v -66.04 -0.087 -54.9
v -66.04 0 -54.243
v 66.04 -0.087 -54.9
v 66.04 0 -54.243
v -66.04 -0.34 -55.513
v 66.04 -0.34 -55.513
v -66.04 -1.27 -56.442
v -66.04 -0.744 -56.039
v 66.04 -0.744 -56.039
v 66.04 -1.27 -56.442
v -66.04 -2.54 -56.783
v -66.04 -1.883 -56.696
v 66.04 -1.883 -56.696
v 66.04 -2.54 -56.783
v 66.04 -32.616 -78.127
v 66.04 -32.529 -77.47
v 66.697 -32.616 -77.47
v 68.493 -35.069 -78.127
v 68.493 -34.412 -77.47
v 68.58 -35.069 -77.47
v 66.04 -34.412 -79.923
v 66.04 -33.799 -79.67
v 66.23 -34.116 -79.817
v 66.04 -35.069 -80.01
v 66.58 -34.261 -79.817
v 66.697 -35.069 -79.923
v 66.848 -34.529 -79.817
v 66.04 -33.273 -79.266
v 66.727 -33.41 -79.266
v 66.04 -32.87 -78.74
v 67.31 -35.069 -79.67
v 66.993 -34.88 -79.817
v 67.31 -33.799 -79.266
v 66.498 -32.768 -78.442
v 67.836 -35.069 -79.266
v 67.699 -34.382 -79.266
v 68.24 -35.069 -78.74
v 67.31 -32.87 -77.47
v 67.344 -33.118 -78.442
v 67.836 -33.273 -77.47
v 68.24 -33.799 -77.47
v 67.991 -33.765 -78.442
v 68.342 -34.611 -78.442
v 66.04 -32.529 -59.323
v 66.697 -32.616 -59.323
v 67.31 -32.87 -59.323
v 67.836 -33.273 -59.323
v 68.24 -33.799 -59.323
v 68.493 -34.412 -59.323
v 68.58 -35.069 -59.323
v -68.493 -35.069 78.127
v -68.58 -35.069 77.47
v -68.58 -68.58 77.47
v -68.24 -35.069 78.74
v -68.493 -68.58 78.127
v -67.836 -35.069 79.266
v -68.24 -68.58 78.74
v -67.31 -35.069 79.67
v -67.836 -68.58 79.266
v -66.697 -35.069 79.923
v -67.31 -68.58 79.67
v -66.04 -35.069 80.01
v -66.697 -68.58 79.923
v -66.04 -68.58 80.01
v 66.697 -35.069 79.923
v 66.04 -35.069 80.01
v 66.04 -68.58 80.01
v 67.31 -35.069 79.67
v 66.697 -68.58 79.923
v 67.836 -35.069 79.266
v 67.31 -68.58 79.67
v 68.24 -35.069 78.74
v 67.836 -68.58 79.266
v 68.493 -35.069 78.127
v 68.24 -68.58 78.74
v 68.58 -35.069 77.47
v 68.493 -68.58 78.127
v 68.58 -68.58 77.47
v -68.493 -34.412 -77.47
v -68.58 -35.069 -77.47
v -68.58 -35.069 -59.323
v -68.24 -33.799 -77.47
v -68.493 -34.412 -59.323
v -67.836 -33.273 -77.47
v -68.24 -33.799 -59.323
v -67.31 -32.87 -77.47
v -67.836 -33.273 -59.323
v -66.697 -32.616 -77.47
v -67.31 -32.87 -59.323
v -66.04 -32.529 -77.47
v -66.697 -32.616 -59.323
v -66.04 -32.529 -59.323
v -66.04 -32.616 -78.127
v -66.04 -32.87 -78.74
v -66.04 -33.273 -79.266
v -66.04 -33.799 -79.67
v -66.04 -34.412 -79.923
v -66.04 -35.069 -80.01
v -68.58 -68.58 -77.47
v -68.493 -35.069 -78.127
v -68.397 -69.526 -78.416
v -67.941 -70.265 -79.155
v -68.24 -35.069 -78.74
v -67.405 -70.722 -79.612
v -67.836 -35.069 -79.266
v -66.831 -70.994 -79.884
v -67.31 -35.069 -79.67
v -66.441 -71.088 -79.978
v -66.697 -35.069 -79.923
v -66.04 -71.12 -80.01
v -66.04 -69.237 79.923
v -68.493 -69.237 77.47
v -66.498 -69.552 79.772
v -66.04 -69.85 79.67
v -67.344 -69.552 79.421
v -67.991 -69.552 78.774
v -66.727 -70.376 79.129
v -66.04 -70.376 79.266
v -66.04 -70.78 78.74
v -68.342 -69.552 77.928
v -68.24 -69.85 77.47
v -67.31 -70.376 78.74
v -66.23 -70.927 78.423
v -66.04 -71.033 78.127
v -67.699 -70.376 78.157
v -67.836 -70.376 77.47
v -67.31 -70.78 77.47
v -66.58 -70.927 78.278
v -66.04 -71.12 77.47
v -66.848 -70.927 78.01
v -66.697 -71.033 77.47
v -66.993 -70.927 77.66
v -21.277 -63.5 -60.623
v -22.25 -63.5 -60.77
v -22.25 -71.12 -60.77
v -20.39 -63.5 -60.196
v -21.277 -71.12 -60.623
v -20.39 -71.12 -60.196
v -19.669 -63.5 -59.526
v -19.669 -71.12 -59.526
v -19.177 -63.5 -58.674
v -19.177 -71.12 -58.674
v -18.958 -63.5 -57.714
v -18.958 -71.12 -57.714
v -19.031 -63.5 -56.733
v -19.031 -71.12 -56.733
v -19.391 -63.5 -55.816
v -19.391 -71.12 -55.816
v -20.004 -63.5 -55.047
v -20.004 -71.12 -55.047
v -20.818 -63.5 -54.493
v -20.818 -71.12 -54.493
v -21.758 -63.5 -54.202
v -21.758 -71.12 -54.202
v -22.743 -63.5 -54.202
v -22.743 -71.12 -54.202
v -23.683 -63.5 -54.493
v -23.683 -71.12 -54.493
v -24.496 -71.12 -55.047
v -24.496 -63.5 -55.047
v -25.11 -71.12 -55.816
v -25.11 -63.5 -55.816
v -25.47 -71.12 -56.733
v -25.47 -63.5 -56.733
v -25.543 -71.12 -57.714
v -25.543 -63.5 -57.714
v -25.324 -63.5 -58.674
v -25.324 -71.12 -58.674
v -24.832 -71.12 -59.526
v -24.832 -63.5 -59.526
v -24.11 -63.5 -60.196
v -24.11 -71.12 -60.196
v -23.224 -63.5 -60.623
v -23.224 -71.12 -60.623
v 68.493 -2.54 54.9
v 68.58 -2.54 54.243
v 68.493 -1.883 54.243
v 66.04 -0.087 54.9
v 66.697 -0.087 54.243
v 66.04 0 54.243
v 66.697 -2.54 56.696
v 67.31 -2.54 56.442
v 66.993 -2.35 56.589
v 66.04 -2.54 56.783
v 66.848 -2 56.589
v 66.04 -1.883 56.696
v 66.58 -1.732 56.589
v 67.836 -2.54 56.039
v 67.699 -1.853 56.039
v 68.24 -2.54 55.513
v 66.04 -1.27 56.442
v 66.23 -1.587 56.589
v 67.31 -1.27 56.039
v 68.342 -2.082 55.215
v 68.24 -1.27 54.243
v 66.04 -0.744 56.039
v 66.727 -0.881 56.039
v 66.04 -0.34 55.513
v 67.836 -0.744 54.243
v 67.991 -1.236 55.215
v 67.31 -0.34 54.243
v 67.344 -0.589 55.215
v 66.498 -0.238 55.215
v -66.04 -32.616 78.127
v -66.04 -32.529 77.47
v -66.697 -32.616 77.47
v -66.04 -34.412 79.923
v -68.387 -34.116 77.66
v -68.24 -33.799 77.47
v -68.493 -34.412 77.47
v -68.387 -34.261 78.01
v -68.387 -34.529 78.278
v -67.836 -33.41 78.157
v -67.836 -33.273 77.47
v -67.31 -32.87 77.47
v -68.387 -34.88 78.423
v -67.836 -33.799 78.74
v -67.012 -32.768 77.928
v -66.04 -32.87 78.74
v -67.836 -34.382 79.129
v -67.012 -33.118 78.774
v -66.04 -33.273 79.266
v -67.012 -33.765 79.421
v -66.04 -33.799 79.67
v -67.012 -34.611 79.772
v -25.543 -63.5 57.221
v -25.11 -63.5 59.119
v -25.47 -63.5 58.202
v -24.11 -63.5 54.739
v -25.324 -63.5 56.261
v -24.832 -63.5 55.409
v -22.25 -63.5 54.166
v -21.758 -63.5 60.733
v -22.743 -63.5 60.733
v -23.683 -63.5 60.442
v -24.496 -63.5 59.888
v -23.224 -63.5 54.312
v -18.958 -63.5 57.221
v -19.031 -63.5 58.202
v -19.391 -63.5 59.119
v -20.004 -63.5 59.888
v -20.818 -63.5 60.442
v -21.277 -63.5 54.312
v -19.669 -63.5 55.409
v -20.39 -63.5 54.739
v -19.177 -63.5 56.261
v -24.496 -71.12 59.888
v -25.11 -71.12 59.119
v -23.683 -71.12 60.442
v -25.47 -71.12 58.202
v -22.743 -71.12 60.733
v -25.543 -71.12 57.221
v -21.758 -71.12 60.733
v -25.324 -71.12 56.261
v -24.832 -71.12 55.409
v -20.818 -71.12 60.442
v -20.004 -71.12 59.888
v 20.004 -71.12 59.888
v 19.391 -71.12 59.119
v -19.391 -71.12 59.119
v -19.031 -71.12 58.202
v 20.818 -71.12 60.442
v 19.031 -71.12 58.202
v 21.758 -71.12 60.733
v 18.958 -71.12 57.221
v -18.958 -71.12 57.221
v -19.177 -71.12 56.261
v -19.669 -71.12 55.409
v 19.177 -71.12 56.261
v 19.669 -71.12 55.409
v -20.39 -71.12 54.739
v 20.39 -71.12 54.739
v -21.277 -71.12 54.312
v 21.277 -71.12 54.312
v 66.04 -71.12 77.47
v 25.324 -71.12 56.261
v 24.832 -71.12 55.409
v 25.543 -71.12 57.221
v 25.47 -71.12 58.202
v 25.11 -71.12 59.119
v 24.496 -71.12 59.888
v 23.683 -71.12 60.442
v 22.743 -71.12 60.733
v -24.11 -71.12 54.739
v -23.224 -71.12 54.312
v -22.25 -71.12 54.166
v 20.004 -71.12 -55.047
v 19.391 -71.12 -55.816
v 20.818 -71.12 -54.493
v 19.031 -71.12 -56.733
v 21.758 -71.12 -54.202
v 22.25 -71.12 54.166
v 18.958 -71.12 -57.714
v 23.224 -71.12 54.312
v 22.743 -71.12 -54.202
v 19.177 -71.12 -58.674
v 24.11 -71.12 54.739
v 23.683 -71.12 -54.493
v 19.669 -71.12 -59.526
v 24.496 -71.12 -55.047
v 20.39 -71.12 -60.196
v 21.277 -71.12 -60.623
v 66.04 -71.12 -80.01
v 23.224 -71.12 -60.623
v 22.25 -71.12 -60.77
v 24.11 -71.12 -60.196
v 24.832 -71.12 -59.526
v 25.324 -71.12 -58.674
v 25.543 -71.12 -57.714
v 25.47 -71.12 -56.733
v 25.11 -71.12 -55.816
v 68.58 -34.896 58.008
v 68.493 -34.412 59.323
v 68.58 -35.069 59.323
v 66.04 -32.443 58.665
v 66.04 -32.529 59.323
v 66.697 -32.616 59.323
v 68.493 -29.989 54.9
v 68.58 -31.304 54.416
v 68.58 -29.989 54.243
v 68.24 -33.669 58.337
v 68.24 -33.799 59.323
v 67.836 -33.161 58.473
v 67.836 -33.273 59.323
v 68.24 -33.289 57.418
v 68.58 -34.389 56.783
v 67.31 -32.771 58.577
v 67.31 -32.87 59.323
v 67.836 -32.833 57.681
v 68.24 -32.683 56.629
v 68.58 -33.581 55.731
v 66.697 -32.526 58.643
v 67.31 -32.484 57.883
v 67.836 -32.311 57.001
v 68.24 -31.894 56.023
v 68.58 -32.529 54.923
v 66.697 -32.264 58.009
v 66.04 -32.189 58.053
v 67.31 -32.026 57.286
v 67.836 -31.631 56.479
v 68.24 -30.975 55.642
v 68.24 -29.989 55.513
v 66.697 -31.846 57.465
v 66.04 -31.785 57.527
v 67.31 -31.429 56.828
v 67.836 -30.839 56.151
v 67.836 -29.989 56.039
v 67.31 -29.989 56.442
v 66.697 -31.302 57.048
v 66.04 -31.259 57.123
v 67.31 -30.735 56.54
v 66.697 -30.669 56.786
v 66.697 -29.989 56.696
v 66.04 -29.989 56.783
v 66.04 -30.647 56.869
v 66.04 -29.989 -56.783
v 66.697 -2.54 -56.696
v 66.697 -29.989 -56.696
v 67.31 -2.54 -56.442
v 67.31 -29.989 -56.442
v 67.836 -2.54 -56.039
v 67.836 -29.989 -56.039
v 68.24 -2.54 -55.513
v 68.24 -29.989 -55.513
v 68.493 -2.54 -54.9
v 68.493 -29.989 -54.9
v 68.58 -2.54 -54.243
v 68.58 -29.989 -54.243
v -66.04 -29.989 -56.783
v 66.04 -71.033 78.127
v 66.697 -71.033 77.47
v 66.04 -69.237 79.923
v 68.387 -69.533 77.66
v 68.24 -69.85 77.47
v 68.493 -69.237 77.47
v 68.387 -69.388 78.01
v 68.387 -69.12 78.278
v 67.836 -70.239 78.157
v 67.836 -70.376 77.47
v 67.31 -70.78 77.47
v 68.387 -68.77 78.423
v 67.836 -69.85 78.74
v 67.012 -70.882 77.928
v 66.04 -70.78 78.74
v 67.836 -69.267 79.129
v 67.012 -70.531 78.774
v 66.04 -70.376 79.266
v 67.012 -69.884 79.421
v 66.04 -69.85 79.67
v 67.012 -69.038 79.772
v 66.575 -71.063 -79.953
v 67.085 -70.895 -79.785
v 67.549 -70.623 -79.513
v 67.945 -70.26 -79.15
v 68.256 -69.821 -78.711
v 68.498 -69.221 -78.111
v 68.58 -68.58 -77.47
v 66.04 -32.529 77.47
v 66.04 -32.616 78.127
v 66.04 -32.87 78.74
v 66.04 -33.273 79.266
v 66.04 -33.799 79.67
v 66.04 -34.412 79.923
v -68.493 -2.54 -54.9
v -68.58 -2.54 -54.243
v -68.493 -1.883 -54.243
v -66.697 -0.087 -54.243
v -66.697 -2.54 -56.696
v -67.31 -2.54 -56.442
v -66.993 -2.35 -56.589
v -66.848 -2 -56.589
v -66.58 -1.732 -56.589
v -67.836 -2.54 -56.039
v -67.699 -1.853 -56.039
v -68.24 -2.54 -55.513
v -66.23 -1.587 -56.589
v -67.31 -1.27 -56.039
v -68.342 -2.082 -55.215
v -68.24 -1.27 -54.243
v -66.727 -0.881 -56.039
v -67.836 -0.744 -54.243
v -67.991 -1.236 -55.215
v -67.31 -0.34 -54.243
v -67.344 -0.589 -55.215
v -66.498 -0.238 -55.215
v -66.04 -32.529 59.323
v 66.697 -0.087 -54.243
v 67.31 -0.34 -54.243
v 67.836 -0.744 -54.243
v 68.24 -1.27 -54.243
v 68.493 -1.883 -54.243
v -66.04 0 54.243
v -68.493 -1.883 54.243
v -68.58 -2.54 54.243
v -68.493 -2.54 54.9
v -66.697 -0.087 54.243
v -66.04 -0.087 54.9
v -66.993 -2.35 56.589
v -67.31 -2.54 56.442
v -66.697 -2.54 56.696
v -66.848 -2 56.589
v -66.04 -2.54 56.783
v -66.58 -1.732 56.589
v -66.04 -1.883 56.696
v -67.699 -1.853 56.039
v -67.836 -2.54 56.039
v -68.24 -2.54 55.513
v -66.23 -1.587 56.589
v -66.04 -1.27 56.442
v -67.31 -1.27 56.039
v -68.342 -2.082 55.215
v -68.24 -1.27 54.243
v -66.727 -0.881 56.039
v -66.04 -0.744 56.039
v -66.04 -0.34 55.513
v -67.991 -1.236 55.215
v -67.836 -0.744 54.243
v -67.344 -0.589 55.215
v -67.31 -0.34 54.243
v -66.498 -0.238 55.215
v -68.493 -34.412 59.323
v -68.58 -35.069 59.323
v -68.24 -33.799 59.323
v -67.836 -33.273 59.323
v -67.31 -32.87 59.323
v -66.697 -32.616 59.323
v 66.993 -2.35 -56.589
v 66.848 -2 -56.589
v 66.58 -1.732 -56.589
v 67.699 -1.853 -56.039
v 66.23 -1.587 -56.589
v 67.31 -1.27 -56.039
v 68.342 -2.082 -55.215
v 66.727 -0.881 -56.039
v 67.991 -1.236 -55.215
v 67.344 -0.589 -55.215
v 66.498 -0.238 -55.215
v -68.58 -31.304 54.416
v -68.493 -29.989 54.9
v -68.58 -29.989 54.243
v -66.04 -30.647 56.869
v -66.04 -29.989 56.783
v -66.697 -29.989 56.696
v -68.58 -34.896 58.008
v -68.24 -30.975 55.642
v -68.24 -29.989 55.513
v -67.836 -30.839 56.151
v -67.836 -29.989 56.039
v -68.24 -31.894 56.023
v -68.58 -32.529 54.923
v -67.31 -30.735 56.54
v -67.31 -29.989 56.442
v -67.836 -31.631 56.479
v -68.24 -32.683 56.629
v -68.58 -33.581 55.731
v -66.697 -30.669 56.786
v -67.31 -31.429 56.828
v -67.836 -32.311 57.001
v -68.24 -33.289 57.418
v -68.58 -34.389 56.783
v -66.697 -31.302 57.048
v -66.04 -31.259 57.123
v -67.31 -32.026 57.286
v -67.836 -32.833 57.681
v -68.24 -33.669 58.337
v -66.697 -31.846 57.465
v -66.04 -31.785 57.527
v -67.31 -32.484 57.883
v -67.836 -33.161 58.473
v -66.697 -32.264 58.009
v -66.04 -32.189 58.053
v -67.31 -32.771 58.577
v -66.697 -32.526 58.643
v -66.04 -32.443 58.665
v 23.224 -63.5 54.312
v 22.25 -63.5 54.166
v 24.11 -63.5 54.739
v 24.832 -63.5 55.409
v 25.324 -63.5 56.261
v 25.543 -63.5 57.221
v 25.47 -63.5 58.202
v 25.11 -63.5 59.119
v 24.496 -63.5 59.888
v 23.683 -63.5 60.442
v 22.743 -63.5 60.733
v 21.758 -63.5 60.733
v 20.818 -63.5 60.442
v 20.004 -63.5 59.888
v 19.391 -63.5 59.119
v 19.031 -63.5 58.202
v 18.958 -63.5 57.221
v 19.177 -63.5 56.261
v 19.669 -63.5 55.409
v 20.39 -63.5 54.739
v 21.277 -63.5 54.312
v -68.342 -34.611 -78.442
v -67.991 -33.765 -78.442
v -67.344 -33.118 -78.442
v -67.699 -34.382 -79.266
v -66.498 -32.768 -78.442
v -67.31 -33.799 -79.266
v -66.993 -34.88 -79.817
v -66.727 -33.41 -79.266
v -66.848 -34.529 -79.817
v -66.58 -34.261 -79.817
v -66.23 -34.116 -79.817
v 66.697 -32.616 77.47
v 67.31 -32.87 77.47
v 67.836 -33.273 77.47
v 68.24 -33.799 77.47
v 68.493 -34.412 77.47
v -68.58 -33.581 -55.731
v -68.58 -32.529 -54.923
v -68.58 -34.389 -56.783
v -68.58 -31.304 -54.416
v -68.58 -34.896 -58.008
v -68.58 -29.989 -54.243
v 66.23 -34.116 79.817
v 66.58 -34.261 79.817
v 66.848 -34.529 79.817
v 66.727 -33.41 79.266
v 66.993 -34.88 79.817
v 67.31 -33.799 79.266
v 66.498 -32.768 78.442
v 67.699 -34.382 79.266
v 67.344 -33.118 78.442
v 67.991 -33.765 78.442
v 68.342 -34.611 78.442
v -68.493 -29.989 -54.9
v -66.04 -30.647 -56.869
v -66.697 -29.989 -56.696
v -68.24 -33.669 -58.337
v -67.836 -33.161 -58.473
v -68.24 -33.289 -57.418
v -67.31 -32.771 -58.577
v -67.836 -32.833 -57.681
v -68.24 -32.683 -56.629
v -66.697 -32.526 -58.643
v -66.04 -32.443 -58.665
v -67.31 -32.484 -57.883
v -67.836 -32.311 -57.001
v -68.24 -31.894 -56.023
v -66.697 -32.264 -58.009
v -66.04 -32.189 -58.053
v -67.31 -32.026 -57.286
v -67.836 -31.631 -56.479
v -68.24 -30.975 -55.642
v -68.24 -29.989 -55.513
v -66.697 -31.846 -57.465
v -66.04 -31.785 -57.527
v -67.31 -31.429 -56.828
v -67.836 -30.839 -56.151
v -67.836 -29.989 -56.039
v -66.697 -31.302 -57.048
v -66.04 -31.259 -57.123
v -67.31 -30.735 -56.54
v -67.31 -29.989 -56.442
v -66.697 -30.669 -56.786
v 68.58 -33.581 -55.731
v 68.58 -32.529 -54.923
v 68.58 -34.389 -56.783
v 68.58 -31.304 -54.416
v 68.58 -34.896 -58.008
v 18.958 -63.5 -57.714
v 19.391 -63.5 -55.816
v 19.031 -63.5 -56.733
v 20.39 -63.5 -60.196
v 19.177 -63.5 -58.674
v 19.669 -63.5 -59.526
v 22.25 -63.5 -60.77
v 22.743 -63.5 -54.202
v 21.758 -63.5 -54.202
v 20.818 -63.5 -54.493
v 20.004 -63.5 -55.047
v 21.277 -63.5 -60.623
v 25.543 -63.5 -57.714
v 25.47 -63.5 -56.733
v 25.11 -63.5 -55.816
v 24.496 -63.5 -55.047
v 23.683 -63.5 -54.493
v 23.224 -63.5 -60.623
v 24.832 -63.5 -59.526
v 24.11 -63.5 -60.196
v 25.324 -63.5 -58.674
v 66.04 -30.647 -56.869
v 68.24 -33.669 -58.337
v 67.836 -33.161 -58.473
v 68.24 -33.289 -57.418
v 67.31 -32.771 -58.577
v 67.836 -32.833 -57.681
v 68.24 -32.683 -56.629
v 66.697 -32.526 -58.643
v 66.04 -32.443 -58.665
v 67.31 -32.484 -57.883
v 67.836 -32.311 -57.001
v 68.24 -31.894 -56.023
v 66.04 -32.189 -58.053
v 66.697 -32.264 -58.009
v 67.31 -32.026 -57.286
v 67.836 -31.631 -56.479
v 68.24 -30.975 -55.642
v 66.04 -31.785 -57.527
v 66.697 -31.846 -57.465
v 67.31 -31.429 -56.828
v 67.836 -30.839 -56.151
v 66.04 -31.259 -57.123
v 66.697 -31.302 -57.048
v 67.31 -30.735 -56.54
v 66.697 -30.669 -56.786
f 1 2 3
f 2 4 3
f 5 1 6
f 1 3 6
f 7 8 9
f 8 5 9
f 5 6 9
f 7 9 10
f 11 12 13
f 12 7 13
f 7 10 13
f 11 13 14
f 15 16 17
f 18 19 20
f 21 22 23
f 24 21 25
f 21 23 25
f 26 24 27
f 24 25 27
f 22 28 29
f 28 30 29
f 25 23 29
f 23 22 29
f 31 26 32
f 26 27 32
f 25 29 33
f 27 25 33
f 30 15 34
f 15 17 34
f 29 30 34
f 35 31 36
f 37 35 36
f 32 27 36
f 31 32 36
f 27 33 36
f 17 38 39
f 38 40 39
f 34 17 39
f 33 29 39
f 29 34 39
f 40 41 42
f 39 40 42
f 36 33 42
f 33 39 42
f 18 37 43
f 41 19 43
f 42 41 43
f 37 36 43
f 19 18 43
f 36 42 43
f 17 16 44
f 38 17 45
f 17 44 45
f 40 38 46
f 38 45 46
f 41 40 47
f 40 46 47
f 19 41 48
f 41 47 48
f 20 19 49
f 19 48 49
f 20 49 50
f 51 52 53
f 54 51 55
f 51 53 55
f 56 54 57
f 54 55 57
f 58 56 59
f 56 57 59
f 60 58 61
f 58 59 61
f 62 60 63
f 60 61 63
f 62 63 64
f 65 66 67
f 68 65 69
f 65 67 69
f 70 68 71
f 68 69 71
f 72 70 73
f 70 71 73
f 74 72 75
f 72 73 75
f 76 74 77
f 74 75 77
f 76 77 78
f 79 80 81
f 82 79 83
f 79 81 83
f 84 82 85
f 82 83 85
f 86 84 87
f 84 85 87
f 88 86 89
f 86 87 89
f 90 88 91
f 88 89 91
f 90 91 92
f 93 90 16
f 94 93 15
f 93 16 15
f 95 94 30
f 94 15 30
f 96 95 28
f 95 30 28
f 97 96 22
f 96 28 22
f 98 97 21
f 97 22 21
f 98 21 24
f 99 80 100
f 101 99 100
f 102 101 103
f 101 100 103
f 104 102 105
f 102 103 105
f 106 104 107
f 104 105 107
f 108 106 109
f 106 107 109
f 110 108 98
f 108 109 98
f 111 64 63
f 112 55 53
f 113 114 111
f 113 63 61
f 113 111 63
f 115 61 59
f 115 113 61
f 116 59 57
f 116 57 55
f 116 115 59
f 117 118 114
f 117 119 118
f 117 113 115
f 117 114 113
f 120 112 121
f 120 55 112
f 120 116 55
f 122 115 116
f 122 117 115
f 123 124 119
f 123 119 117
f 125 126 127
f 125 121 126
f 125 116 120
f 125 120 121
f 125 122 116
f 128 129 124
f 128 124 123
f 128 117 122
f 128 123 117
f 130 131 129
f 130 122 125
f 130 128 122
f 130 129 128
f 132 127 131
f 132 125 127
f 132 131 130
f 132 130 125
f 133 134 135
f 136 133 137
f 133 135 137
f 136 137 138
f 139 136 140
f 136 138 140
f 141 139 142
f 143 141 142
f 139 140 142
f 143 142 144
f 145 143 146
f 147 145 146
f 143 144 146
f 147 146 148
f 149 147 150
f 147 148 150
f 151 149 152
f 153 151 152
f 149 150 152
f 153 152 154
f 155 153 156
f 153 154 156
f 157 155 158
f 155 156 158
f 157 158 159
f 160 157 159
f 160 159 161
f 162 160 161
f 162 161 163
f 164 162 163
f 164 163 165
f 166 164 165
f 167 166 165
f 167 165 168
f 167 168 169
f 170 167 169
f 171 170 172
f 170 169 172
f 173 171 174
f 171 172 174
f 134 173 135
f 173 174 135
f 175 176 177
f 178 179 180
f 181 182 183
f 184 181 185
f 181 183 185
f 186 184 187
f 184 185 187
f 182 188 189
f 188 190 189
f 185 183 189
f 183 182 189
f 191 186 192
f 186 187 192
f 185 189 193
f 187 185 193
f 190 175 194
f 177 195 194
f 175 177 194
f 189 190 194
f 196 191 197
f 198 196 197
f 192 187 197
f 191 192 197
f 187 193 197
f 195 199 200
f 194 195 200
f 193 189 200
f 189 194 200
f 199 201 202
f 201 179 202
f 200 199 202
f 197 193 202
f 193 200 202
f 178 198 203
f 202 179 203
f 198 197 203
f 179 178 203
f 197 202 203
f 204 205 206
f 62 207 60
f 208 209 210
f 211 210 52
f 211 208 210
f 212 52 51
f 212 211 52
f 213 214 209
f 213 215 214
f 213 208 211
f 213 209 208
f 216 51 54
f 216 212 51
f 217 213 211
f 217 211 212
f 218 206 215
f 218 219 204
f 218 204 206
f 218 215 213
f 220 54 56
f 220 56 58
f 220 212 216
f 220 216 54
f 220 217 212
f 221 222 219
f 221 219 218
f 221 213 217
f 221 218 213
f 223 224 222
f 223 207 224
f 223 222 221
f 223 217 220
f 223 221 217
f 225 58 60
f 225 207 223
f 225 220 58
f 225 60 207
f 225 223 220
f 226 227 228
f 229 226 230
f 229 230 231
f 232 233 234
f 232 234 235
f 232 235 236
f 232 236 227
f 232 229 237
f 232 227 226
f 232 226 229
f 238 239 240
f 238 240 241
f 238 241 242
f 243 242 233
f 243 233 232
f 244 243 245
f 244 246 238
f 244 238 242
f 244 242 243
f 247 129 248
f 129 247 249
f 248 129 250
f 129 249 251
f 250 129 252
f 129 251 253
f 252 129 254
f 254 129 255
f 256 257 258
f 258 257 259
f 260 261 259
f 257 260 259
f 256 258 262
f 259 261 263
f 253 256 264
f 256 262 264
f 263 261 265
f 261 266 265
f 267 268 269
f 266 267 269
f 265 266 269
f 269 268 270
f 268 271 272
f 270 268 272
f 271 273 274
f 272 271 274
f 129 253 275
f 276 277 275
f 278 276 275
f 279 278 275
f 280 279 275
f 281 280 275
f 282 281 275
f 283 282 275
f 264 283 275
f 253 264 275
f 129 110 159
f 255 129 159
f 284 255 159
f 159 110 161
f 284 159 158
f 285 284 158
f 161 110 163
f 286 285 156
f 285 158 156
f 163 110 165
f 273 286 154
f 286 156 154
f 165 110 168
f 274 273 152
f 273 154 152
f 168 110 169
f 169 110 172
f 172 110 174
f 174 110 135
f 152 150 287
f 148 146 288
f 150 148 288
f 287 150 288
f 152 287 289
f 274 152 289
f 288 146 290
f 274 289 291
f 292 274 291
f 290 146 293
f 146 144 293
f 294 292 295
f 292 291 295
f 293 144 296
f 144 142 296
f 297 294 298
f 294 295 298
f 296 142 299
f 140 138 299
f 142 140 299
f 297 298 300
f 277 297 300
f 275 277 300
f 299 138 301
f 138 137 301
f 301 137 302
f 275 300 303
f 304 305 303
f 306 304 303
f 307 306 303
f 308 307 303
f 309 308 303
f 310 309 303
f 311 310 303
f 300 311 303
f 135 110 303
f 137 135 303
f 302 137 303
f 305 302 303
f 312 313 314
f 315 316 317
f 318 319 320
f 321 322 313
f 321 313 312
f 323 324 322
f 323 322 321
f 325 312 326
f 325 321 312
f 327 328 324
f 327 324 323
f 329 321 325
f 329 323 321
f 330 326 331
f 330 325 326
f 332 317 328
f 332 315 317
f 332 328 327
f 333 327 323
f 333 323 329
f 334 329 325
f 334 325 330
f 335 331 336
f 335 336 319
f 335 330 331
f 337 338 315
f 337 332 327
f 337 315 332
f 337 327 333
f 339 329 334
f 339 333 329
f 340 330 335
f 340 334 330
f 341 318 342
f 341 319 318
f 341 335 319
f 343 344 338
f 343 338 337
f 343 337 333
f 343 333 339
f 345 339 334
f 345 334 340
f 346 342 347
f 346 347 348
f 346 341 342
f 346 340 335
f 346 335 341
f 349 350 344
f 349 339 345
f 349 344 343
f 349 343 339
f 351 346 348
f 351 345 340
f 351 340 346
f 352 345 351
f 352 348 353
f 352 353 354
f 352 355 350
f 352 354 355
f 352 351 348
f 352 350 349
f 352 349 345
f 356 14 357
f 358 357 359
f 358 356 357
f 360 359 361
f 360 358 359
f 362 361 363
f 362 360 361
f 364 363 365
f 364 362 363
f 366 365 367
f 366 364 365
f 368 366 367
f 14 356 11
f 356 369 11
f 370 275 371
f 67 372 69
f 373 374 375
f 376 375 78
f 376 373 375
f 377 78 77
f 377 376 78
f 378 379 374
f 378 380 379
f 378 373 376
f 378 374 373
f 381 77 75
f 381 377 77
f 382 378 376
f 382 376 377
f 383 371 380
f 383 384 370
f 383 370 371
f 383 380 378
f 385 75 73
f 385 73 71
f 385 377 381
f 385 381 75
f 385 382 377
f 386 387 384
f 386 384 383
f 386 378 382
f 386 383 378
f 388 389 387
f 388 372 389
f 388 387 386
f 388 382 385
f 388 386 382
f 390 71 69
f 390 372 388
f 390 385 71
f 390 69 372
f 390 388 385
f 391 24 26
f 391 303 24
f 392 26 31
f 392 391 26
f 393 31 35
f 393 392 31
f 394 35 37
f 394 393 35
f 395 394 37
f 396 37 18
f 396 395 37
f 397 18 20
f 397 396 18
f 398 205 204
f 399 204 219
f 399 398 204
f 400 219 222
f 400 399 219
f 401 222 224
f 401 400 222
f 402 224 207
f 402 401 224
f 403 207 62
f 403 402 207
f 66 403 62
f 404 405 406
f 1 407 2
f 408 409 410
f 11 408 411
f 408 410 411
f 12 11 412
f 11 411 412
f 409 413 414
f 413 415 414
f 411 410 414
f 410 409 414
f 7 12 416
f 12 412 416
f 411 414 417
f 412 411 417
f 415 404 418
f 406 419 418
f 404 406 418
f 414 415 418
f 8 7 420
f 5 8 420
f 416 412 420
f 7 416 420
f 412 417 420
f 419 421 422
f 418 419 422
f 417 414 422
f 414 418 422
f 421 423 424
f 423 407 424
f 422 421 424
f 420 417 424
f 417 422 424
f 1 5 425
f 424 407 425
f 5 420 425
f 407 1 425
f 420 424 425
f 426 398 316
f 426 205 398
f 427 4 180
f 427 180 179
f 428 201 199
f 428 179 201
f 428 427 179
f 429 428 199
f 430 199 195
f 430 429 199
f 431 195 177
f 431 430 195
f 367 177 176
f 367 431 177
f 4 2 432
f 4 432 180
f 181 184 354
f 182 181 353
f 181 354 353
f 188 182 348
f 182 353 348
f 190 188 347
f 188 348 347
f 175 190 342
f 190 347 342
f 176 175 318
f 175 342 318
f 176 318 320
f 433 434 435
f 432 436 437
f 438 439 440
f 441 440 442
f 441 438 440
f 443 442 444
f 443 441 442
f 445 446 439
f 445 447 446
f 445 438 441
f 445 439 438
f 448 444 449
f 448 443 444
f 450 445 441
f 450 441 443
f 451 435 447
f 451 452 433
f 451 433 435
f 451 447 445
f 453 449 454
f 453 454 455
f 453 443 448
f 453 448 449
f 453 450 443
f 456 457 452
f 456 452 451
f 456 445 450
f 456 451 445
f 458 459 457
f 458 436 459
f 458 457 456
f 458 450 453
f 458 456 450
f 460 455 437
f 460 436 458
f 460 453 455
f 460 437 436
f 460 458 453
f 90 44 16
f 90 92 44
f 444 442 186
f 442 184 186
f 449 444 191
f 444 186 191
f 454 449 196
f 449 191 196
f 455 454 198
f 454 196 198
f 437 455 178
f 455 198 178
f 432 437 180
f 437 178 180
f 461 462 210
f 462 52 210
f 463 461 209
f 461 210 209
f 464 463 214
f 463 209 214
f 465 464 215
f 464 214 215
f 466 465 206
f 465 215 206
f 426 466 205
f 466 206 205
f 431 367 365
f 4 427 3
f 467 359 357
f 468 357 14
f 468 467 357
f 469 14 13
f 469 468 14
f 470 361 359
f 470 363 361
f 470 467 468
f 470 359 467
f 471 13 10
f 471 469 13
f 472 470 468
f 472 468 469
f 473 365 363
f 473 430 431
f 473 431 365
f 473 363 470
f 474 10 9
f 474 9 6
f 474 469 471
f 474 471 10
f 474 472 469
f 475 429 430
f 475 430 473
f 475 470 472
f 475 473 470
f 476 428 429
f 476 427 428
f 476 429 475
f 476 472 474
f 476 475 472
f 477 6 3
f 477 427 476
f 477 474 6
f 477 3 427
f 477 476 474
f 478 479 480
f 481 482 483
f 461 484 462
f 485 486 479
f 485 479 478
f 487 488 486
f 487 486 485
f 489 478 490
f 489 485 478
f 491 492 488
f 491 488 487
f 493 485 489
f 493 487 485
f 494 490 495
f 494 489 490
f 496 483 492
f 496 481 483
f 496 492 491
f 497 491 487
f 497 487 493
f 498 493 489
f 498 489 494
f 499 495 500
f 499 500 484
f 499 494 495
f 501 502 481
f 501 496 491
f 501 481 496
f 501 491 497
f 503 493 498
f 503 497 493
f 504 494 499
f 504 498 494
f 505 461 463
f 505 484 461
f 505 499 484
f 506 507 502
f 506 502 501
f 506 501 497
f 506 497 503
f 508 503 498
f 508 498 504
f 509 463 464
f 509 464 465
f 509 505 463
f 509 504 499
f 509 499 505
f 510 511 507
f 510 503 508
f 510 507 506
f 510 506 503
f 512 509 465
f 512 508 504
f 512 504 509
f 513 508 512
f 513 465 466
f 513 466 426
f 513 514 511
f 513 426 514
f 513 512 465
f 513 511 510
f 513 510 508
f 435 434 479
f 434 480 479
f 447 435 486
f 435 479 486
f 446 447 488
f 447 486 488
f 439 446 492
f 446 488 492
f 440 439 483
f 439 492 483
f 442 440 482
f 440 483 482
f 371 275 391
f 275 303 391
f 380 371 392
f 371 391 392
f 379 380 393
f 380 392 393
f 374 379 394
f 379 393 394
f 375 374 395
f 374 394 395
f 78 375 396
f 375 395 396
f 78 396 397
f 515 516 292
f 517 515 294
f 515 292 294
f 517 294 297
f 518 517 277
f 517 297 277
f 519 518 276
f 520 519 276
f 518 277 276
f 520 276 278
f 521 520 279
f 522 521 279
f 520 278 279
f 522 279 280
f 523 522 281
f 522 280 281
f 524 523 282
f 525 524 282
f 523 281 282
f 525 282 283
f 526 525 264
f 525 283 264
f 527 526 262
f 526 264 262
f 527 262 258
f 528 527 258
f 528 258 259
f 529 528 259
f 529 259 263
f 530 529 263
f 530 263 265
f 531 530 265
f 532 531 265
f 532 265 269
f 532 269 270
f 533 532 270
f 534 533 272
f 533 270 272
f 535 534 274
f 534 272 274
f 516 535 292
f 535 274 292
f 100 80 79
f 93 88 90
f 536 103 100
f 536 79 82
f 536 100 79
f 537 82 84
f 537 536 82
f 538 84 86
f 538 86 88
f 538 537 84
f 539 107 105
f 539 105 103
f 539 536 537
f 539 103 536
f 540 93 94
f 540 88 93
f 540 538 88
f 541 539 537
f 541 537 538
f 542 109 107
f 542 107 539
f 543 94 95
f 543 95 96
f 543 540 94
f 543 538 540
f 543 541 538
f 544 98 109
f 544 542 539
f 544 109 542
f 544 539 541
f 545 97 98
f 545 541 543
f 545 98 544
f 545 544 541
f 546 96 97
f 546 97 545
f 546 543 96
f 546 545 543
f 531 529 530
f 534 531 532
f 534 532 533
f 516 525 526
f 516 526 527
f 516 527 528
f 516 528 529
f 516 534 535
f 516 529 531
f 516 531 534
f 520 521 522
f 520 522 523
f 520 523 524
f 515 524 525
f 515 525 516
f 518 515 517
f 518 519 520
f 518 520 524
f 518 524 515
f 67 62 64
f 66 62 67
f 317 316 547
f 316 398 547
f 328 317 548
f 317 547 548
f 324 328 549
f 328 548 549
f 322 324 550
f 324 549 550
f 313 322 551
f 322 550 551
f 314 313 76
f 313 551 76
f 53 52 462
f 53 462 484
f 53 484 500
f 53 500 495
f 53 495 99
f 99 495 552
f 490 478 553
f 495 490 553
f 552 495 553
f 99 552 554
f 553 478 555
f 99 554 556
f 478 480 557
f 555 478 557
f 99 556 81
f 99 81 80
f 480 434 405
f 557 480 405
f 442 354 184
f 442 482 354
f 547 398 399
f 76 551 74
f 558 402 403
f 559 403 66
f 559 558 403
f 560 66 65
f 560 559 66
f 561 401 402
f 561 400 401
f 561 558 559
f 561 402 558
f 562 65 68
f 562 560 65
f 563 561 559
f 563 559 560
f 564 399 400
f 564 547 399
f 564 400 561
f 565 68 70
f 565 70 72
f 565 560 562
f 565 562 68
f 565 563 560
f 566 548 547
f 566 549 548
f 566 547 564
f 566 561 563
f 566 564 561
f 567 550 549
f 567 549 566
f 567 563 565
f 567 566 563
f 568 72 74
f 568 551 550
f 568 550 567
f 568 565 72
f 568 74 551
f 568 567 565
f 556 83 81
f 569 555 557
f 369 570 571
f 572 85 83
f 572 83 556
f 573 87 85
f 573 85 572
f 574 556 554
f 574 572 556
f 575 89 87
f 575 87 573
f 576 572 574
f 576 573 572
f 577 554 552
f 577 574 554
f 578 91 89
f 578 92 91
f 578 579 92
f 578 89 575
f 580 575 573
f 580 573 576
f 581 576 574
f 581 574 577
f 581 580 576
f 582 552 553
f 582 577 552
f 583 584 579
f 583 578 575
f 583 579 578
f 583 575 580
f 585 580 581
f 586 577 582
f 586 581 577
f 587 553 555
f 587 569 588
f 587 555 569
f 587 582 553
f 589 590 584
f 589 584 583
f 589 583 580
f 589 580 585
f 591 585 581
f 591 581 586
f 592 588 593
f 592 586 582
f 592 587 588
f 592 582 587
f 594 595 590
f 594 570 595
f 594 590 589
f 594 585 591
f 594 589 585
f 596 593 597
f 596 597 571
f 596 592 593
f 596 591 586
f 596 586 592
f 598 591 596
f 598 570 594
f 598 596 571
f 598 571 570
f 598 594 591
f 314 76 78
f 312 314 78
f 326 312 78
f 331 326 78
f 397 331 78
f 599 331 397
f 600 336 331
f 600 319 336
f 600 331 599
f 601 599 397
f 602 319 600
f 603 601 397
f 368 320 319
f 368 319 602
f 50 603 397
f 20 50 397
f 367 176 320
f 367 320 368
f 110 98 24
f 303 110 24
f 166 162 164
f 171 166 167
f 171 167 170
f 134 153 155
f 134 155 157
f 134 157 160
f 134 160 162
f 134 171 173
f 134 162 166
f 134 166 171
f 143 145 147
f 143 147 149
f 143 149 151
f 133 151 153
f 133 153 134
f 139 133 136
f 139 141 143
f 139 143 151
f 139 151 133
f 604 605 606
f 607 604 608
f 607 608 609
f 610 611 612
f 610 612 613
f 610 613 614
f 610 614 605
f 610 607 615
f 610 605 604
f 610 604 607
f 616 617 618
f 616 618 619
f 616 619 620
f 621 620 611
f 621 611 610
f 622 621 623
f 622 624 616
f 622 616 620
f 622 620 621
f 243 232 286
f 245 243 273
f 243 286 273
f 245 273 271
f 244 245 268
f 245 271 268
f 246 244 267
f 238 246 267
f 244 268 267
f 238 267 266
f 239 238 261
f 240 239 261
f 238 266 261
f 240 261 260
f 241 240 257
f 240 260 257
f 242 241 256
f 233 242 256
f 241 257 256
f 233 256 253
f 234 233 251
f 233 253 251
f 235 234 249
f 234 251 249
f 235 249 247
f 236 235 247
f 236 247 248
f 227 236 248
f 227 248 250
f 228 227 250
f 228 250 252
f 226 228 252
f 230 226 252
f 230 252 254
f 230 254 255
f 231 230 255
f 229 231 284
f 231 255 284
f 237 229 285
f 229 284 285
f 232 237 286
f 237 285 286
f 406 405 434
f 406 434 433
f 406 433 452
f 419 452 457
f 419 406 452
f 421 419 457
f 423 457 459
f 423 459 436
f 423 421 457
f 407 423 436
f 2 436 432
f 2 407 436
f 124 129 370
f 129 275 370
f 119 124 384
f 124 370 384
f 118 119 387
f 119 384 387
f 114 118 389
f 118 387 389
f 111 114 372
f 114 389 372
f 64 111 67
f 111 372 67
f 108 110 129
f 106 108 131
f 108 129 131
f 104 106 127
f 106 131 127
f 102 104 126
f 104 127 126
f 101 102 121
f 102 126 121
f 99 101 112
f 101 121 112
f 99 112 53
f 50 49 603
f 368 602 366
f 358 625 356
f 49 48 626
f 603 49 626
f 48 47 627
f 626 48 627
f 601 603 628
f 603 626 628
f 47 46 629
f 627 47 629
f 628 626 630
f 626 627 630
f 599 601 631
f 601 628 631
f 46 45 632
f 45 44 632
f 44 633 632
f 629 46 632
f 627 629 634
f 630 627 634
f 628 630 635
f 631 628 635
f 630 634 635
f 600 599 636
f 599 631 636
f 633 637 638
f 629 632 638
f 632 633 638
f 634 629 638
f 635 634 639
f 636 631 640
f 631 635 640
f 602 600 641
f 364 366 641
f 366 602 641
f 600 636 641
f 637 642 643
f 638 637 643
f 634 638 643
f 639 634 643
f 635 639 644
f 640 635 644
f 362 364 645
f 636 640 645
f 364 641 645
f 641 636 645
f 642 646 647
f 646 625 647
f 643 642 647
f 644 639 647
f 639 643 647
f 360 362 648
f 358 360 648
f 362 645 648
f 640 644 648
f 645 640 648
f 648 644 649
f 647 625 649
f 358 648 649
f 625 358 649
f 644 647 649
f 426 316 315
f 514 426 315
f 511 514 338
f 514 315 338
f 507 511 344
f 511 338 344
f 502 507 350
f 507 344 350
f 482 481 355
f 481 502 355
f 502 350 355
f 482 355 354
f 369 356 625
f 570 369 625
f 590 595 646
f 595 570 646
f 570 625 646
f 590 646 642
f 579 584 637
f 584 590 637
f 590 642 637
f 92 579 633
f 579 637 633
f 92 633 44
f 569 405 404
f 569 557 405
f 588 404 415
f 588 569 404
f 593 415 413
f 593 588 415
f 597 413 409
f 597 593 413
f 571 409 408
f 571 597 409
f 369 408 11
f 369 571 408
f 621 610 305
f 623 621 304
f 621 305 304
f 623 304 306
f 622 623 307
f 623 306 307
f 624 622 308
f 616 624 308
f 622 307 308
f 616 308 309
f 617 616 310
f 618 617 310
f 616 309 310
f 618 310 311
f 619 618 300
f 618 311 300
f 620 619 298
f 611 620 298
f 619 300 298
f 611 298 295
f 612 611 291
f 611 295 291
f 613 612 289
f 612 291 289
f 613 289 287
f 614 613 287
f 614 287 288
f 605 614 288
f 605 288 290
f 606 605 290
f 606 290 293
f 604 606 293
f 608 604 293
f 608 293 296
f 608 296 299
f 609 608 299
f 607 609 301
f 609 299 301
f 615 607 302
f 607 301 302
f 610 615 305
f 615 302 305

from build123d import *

# Parameters (mm, degrees)
SKETCH1_W               = 137.16
SKETCH1_H               = 160.02
BOSS_EXTRUDE1_DEPTH     = 71.12
CUT_EXTRUDE1_DEPTH      = 174.99
CUT_EXTRUDE1_DEPTH_BACK = 174.99
SKETCH2_W               = 23.227349815
SKETCH2_H               = 32.529214904
FILLET1_R               = 2.54
FILLET2_R               = 2.54
SKETCH3_R               = 3.302
CUT_EXTRUDE2_DEPTH      = 7.62


with BuildPart() as part:
    # Sketch1 → Boss-Extrude1 (new body)
    with BuildSketch(Plane(origin=(0, 0, 0), x_dir=(1, 0, 0), z_dir=(0, 1, 0))):
        Rectangle(SKETCH1_W, SKETCH1_H)
    extrude(amount=-BOSS_EXTRUDE1_DEPTH)

    # Sketch2 → Cut-Extrude1 (cut, two sides: drawn at the far end of the back side and taken through both)
    with BuildSketch(Plane(origin=(68.58, 0, 0), x_dir=(0, 0, -1), z_dir=(1, 0, 0)).offset(-CUT_EXTRUDE1_DEPTH_BACK)):
        with Locations((-68.396325093, -16.264607452)):
            Rectangle(SKETCH2_W, SKETCH2_H)
        with Locations((68.396325093, -16.264607452)):
            Rectangle(SKETCH2_W, SKETCH2_H)
    extrude(amount=CUT_EXTRUDE1_DEPTH + CUT_EXTRUDE1_DEPTH_BACK, mode=Mode.SUBTRACT)

    # Fillet1
    fillet1_edges = [part.edges().sort_by_distance(p)[0] for p in [
        (68.58, 0, 0),
        (-68.58, 0, 0),
        (0, -71.12, 80.01),
        (68.58, -32.529214904, 68.396325092),
        (68.58, -16.264607452, 56.782650185),
        (0, -32.529214904, 80.01),
        (-68.58, -16.264607452, 56.782650185),
        (0, 0, 56.782650185),
        (-68.58, -32.529214904, 68.396325092),
        (0, -32.529214904, 56.782650185),
        (68.58, -32.529214904, -68.396325092),
        (68.58, -16.264607452, -56.782650185),
        (-68.58, -16.264607452, -56.782650185),
        (0, -32.529214904, -56.782650185),
        (0, 0, -56.782650185),
        (-68.58, -32.529214904, -68.396325092),
        (0, -32.529214904, -80.01),
        (68.58, -71.12, 0),
        (68.58, -51.824607452, 80.01),
        (-68.58, -51.824607452, 80.01),
        (68.58, -51.824607452, -80.01),
    ]]
    fillet(fillet1_edges, radius=FILLET1_R)

    # Fillet2
    # the kernel refuses this fillet: 2.54 mm, written as the material it takes off along each edge
    with BuildSketch(Plane(origin=(-66.04, -68.58, 77.47), x_dir=(-1, 0, 0), z_dir=(0, -1, 0))) as fillet2_piece_1_section:
        Polygon((0, 0), (FILLET2_R, 0), (FILLET2_R, -FILLET2_R), (0, -FILLET2_R), align=None)
    fillet2_piece_1 = extrude(amount=FILLET2_R, mode=Mode.PRIVATE)
    fillet2_piece_1 = fillet2_piece_1 - Plane(origin=(-66.04, -68.58, 77.47), x_dir=(0.7071067811865475, 0, -0.7071067811865476), z_dir=(0, -1, 0)) * Sphere(FILLET2_R, mode=Mode.PRIVATE)
    add(fillet2_piece_1, mode=Mode.SUBTRACT)
    with BuildSketch(Plane(origin=(-66.04, -35.069214904, -77.47), x_dir=(-1, 0, 0), z_dir=(0, 0, -1))) as fillet2_piece_2_section:
        Polygon((0, 0), (FILLET2_R, 0), (FILLET2_R, FILLET2_R), (0, FILLET2_R), align=None)
    fillet2_piece_2 = extrude(amount=FILLET2_R, mode=Mode.PRIVATE)
    fillet2_piece_2 = fillet2_piece_2 - Plane(origin=(-66.04, -35.069214904, -77.47), x_dir=(0.7071067811865475, -0.7071067811865475, 0), z_dir=(0, 0, -1)) * Sphere(FILLET2_R, mode=Mode.PRIVATE)
    add(fillet2_piece_2, mode=Mode.SUBTRACT)
    with BuildSketch(Plane(origin=(-68.58, -71.12, 77.47), x_dir=(1, 0, 0), z_dir=(0, 0, -1))) as fillet2_piece_3:
        with BuildLine():
            CenterArc((FILLET2_R, -FILLET2_R), FILLET2_R, 90, 90)
            Line((0, -FILLET2_R), (0, 0))
            Line((0, 0), (FILLET2_R, 0))
        make_face()
    extrude(amount=163.83, mode=Mode.SUBTRACT)
    with BuildSketch(Plane(origin=(-68.58, -35.069214904, -80.01), x_dir=(1, 0, 0), z_dir=(0, -1, 0))) as fillet2_piece_4:
        with BuildLine():
            CenterArc((FILLET2_R, FILLET2_R), FILLET2_R, 180, 90)
            Line((0, FILLET2_R), (0, 0))
            Line((0, 0), (FILLET2_R, 0))
        make_face()
    extrude(amount=42.400785096, mode=Mode.SUBTRACT)

    # Sketch3 → Cut-Extrude2 (cut)
    with BuildSketch(Plane.XZ.offset(71.12)):
        with Locations(Location((-22.2504, -57.4675, 0), (0, 0, 270))):
            Circle(SKETCH3_R)
        with Locations(Location((-22.2504, 57.4675, 0), (0, 0, 270))):
            Circle(SKETCH3_R)
        with Locations(Location((22.2504, 57.4675, 0), (0, 0, 270))):
            Circle(SKETCH3_R)
        with Locations(Location((22.2504, -57.4675, 0), (0, 0, 270))):
            Circle(SKETCH3_R)
    extrude(amount=-CUT_EXTRUDE2_DEPTH, mode=Mode.SUBTRACT)


solid = part.part
